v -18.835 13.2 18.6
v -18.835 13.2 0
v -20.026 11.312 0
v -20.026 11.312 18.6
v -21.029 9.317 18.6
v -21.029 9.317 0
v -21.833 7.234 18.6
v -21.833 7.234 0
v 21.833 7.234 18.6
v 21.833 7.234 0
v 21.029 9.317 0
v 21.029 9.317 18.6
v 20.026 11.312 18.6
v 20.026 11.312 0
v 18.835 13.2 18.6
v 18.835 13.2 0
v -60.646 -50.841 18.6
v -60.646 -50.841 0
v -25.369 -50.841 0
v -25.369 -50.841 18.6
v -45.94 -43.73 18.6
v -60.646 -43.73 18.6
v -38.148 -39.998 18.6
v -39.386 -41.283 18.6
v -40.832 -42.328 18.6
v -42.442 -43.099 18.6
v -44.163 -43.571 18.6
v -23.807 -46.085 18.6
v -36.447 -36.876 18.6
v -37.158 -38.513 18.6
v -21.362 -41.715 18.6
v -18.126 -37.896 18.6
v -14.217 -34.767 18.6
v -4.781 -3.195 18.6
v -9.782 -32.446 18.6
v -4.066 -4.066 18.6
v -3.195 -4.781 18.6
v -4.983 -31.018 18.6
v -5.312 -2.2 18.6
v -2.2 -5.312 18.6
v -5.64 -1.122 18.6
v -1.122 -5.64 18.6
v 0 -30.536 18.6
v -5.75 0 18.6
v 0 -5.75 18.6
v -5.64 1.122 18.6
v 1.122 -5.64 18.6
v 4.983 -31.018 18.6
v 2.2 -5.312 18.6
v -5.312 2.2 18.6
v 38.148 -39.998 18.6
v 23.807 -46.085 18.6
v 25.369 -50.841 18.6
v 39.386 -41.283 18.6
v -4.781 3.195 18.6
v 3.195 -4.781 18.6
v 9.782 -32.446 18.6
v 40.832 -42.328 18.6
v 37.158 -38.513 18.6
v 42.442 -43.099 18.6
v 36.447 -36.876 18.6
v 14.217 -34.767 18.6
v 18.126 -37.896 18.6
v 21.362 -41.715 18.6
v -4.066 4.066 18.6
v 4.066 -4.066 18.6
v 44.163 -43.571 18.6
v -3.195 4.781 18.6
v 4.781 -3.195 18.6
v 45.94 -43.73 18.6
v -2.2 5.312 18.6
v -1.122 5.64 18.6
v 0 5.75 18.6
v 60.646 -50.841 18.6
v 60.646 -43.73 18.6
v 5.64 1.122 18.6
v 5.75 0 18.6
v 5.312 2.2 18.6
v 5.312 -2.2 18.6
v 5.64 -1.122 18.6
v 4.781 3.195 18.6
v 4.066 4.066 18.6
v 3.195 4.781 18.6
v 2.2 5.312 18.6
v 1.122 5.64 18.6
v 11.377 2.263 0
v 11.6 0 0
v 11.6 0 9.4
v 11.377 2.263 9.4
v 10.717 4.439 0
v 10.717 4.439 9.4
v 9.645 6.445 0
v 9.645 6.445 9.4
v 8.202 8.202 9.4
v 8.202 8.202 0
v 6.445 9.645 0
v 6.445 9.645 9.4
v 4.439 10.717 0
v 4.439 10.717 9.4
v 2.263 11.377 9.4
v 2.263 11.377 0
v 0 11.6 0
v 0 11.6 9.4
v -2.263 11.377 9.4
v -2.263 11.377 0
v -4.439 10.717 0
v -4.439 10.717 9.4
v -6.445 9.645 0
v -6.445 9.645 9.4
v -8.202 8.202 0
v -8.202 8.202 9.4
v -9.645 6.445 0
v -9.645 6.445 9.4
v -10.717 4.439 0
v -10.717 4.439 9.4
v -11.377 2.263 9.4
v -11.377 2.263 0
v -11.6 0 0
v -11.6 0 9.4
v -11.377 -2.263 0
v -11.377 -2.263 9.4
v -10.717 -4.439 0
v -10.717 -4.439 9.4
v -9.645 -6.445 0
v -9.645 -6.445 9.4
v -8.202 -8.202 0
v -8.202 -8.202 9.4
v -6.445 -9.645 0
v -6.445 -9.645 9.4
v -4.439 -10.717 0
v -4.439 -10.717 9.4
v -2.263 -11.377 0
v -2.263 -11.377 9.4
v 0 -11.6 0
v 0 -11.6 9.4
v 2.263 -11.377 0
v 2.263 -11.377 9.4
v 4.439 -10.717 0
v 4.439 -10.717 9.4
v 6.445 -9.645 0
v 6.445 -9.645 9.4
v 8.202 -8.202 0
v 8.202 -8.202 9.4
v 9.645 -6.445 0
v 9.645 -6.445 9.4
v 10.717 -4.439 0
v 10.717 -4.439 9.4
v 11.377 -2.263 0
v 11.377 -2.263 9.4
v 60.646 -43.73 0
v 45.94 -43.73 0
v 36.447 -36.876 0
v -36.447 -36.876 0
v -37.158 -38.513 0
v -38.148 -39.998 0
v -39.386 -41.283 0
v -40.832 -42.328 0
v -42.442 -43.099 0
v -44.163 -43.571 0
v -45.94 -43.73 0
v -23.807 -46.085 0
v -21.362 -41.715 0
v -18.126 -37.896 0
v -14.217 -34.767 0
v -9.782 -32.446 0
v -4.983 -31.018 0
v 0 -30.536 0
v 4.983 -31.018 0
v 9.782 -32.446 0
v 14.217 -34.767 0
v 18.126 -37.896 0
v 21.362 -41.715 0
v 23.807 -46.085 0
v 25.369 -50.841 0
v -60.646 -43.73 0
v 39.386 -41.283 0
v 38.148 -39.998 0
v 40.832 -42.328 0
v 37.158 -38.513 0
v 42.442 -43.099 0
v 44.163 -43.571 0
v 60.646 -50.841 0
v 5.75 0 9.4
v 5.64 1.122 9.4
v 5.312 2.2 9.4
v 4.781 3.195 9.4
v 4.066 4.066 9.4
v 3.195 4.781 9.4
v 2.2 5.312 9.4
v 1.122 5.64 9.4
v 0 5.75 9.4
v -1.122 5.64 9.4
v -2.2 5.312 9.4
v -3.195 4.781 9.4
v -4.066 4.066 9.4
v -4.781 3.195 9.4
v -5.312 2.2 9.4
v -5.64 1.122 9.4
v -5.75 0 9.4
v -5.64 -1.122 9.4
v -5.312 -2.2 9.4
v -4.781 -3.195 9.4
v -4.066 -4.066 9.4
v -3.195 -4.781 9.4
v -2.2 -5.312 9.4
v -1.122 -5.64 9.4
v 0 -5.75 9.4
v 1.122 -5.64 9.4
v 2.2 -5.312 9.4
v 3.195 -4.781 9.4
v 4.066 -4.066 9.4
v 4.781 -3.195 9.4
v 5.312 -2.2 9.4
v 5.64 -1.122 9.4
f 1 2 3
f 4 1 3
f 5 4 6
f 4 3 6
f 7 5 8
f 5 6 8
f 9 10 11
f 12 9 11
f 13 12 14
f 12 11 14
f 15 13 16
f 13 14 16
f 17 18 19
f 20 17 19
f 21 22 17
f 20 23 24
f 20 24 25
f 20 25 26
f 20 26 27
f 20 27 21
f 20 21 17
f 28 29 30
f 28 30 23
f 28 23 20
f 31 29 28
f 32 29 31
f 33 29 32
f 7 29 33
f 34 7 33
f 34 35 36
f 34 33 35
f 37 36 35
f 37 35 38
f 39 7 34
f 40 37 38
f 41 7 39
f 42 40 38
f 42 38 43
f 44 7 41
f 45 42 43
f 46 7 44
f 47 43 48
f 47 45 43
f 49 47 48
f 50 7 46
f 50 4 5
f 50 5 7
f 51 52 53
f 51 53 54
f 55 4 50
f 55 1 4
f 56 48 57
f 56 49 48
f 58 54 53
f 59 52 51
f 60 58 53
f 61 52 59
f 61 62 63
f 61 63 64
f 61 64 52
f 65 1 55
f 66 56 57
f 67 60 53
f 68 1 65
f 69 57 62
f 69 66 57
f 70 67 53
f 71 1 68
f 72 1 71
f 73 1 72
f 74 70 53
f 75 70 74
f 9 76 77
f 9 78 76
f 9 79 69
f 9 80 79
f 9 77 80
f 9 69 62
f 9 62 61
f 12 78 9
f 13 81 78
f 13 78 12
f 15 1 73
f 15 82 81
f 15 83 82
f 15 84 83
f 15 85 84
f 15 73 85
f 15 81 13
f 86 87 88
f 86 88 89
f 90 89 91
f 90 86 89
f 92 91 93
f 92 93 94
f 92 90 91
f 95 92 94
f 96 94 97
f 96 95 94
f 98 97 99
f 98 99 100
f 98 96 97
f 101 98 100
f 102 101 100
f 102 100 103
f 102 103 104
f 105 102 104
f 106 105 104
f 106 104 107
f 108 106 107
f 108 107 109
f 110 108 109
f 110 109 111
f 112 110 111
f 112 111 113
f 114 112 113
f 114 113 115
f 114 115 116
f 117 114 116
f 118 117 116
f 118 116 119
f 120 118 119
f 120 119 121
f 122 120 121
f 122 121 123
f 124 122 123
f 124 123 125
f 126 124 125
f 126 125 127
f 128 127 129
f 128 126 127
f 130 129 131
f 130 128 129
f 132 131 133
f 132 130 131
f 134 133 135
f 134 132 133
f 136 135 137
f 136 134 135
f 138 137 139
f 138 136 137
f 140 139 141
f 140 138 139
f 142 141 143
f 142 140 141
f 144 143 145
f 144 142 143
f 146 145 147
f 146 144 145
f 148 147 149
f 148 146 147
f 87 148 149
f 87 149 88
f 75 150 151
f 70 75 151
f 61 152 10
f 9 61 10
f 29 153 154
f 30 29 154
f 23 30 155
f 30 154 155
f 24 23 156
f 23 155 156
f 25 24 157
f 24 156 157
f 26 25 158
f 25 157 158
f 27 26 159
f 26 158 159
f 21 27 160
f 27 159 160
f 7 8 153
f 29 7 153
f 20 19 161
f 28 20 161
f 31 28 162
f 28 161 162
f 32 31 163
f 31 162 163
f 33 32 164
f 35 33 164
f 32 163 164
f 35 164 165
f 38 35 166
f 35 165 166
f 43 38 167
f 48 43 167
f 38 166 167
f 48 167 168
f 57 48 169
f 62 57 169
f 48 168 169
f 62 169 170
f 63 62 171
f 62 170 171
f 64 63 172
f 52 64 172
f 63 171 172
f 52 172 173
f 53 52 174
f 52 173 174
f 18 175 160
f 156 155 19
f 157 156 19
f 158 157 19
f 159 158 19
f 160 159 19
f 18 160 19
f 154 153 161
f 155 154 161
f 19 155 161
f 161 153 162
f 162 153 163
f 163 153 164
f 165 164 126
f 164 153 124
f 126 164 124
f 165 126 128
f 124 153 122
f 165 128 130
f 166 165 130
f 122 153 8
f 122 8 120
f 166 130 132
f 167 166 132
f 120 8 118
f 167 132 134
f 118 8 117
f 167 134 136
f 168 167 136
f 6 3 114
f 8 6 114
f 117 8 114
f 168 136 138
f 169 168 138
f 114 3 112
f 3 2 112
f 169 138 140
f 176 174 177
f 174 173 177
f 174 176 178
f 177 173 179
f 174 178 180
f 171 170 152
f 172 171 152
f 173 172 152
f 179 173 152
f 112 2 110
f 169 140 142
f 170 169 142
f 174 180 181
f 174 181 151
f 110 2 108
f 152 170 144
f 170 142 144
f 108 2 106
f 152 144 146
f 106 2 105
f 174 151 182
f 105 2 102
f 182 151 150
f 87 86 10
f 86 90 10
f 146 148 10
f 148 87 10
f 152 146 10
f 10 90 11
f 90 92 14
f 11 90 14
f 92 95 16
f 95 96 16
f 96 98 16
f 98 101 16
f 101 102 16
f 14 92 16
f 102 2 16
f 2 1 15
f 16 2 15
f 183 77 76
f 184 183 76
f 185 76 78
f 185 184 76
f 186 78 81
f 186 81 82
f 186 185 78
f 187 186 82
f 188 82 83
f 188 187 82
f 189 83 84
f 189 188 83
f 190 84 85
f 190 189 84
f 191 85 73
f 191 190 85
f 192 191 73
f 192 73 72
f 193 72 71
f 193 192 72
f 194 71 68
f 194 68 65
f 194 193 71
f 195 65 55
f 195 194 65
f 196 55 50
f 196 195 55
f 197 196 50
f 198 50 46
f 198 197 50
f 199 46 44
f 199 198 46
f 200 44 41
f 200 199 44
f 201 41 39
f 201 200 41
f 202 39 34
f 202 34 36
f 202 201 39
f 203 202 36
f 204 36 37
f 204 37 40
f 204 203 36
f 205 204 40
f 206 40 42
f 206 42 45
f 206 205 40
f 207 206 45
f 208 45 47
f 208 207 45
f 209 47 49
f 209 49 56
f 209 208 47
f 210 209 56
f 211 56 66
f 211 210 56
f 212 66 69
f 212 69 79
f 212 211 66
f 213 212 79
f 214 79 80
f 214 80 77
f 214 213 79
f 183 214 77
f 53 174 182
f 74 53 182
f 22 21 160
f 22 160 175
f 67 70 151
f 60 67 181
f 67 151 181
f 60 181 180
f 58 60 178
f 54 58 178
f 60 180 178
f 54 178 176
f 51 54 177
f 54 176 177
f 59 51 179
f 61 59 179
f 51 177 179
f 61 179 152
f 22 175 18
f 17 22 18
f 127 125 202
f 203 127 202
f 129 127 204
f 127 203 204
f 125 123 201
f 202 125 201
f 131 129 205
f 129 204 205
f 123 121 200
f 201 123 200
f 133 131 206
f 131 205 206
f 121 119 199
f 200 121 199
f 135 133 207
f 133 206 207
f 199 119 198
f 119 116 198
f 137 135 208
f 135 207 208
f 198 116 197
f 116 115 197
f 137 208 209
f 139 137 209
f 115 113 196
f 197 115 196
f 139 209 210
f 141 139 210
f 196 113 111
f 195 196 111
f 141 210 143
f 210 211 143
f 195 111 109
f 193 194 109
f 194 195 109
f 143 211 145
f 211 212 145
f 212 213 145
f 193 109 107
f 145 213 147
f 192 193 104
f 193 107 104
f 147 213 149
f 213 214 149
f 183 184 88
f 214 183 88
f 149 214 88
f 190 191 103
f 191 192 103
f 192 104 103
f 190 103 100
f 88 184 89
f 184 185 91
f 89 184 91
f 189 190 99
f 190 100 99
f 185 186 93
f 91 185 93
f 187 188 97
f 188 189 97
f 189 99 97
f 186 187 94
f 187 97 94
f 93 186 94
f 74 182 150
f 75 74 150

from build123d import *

# Parameters (mm, degrees)
F0_R      = 11.6
F1_DEPTH  = 25.4
F2_R      = 11.6
F2_R_2    = 5.75
F3_DEPTH  = 16
F4_R      = 2.6054950693
F5_DEPTH  = 25
F6_DEPTH  = 13
F7_DEPTH  = 13
F8_DEPTH  = 25
F10_START = -13.2
F9_W      = 101.4740765095
F9_H      = 163.1420962512
F10_DEPTH = 15.6
F11_DEPTH = 19.8


with BuildPart() as f1:
    # F0 (on Top) → F1 (new body)
    with BuildSketch(Plane.XY):
        with BuildLine():
            Line((36.4474654198, -36.875538528), (21.8328172584, 7.2338157676))
            ThreePointArc((21.8328172584, 7.2338157676), (0, 23), (-21.8328172584, 7.2338157676))
            Line((-21.8328172584, 7.2338157676), (-36.4474654198, -36.875538528))
            ThreePointArc((-36.4474654198, -36.875538528), (-40.0855678291, -41.8375392315), (-45.9399946626, -43.7304012377))
            Line((-45.9399946626, -43.7304012377), (-60.6462528196, -43.7304012377))
            Line((-60.6462528196, -43.7304012377), (-60.6462528196, -50.8411786739))
            Line((-60.6462528196, -50.8411786739), (-25.3686927199, -50.8411786739))
            ThreePointArc((-25.3686927199, -50.8411786739), (0, -30.5358630094), (25.3686927199, -50.8411786739))
            Line((25.3686927199, -50.8411786739), (60.6462528196, -50.8411786739))
            Line((60.6462528196, -50.8411786739), (60.6462528196, -43.7304012377))
            Line((60.6462528196, -43.7304012377), (45.9399946626, -43.7304012377))
            ThreePointArc((45.9399946626, -43.7304012377), (40.0855678291, -41.8375392315), (36.4474654198, -36.875538528))
        make_face()
        Circle(F0_R, mode=Mode.SUBTRACT)
    extrude(amount=F1_DEPTH)

    # F2 (on face) → F3 (join)
    with BuildSketch(Plane.XY.offset(25.4)):
        Circle(F2_R)
        Circle(F2_R_2, mode=Mode.SUBTRACT)
    extrude(amount=-F3_DEPTH)

    # F4 (on face) → F5 (cut)
    with BuildSketch(Plane(origin=(0, -43.7304012377, 0), x_dir=(-1, 0, 0), z_dir=(0, 1, 0))):
        with Locations((-53.2931237411, 12.7)):
            Circle(F4_R)
        with Locations((53.2931237411, 12.7)):
            Circle(F4_R)
    extrude(amount=-F5_DEPTH, mode=Mode.SUBTRACT)

    # F2 (on face) → F6 (join)
    with BuildSketch(Plane.XY.offset(25.4)):
        with BuildLine():
            Line((-60.6462528196, -50.8411786739), (-25.3686927199, -50.8411786739))
            ThreePointArc((-25.3686927199, -50.8411786739), (0, -30.5358630094), (25.3686927199, -50.8411786739))
            Line((25.3686927199, -50.8411786739), (60.6462528196, -50.8411786739))
            Line((60.6462528196, -50.8411786739), (60.6462528196, -43.7304012377))
            Line((60.6462528196, -43.7304012377), (45.9399946626, -43.7304012377))
            ThreePointArc((45.9399946626, -43.7304012377), (40.0855678291, -41.8375392315), (36.4474654198, -36.875538528))
            Line((36.4474654198, -36.875538528), (21.8328172584, 7.2338157676))
            ThreePointArc((21.8328172584, 7.2338157676), (0, 23), (-21.8328172584, 7.2338157676))
            Line((-21.8328172584, 7.2338157676), (-36.4474654198, -36.875538528))
            ThreePointArc((-36.4474654198, -36.875538528), (-40.0855678291, -41.8375392315), (-45.9399946626, -43.7304012377))
            Line((-45.9399946626, -43.7304012377), (-60.6462528196, -43.7304012377))
            Line((-60.6462528196, -43.7304012377), (-60.6462528196, -50.8411786739))
        make_face()
        Circle(F2_R, mode=Mode.SUBTRACT)
    extrude(amount=F6_DEPTH)

    # F2 (on face) → F7 (join, through all)
    with BuildSketch(Plane.XY.offset(25.4)):
        Circle(F2_R)
        Circle(F2_R_2, mode=Mode.SUBTRACT)
    extrude(amount=F7_DEPTH)

    # F0 (on Top) → F8 (join)
    with BuildSketch(Plane.XY):
        with BuildLine():
            Line((36.4474654198, -36.875538528), (21.8328172584, 7.2338157676))
            ThreePointArc((21.8328172584, 7.2338157676), (0, 23), (-21.8328172584, 7.2338157676))
            Line((-21.8328172584, 7.2338157676), (-36.4474654198, -36.875538528))
            ThreePointArc((-36.4474654198, -36.875538528), (-40.0855678291, -41.8375392315), (-45.9399946626, -43.7304012377))
            Line((-45.9399946626, -43.7304012377), (-60.6462528196, -43.7304012377))
            Line((-60.6462528196, -43.7304012377), (-60.6462528196, -50.8411786739))
            Line((-60.6462528196, -50.8411786739), (-25.3686927199, -50.8411786739))
            ThreePointArc((-25.3686927199, -50.8411786739), (0, -30.5358630094), (25.3686927199, -50.8411786739))
            Line((25.3686927199, -50.8411786739), (60.6462528196, -50.8411786739))
            Line((60.6462528196, -50.8411786739), (60.6462528196, -43.7304012377))
            Line((60.6462528196, -43.7304012377), (45.9399946626, -43.7304012377))
            ThreePointArc((45.9399946626, -43.7304012377), (40.0855678291, -41.8375392315), (36.4474654198, -36.875538528))
        make_face()
        Circle(F0_R, mode=Mode.SUBTRACT)
    extrude(amount=F8_DEPTH)

    # F9 (on Front) → F10 (cut)
    with BuildSketch(Plane.XZ.offset(F10_START)):
        with Locations((-7.8580155969, 21.2894622236)):
            Rectangle(F9_W, F9_H)
    extrude(amount=-F10_DEPTH, mode=Mode.SUBTRACT)

    # F11 (cut): a face of the model
    f11_faces = [f1.faces().sort_by_distance(p)[0] for p in [
        (0, -21.0137412442, 38.4),
    ]]
    extrude(f11_faces, amount=-F11_DEPTH, mode=Mode.SUBTRACT)


solid = f1.part
